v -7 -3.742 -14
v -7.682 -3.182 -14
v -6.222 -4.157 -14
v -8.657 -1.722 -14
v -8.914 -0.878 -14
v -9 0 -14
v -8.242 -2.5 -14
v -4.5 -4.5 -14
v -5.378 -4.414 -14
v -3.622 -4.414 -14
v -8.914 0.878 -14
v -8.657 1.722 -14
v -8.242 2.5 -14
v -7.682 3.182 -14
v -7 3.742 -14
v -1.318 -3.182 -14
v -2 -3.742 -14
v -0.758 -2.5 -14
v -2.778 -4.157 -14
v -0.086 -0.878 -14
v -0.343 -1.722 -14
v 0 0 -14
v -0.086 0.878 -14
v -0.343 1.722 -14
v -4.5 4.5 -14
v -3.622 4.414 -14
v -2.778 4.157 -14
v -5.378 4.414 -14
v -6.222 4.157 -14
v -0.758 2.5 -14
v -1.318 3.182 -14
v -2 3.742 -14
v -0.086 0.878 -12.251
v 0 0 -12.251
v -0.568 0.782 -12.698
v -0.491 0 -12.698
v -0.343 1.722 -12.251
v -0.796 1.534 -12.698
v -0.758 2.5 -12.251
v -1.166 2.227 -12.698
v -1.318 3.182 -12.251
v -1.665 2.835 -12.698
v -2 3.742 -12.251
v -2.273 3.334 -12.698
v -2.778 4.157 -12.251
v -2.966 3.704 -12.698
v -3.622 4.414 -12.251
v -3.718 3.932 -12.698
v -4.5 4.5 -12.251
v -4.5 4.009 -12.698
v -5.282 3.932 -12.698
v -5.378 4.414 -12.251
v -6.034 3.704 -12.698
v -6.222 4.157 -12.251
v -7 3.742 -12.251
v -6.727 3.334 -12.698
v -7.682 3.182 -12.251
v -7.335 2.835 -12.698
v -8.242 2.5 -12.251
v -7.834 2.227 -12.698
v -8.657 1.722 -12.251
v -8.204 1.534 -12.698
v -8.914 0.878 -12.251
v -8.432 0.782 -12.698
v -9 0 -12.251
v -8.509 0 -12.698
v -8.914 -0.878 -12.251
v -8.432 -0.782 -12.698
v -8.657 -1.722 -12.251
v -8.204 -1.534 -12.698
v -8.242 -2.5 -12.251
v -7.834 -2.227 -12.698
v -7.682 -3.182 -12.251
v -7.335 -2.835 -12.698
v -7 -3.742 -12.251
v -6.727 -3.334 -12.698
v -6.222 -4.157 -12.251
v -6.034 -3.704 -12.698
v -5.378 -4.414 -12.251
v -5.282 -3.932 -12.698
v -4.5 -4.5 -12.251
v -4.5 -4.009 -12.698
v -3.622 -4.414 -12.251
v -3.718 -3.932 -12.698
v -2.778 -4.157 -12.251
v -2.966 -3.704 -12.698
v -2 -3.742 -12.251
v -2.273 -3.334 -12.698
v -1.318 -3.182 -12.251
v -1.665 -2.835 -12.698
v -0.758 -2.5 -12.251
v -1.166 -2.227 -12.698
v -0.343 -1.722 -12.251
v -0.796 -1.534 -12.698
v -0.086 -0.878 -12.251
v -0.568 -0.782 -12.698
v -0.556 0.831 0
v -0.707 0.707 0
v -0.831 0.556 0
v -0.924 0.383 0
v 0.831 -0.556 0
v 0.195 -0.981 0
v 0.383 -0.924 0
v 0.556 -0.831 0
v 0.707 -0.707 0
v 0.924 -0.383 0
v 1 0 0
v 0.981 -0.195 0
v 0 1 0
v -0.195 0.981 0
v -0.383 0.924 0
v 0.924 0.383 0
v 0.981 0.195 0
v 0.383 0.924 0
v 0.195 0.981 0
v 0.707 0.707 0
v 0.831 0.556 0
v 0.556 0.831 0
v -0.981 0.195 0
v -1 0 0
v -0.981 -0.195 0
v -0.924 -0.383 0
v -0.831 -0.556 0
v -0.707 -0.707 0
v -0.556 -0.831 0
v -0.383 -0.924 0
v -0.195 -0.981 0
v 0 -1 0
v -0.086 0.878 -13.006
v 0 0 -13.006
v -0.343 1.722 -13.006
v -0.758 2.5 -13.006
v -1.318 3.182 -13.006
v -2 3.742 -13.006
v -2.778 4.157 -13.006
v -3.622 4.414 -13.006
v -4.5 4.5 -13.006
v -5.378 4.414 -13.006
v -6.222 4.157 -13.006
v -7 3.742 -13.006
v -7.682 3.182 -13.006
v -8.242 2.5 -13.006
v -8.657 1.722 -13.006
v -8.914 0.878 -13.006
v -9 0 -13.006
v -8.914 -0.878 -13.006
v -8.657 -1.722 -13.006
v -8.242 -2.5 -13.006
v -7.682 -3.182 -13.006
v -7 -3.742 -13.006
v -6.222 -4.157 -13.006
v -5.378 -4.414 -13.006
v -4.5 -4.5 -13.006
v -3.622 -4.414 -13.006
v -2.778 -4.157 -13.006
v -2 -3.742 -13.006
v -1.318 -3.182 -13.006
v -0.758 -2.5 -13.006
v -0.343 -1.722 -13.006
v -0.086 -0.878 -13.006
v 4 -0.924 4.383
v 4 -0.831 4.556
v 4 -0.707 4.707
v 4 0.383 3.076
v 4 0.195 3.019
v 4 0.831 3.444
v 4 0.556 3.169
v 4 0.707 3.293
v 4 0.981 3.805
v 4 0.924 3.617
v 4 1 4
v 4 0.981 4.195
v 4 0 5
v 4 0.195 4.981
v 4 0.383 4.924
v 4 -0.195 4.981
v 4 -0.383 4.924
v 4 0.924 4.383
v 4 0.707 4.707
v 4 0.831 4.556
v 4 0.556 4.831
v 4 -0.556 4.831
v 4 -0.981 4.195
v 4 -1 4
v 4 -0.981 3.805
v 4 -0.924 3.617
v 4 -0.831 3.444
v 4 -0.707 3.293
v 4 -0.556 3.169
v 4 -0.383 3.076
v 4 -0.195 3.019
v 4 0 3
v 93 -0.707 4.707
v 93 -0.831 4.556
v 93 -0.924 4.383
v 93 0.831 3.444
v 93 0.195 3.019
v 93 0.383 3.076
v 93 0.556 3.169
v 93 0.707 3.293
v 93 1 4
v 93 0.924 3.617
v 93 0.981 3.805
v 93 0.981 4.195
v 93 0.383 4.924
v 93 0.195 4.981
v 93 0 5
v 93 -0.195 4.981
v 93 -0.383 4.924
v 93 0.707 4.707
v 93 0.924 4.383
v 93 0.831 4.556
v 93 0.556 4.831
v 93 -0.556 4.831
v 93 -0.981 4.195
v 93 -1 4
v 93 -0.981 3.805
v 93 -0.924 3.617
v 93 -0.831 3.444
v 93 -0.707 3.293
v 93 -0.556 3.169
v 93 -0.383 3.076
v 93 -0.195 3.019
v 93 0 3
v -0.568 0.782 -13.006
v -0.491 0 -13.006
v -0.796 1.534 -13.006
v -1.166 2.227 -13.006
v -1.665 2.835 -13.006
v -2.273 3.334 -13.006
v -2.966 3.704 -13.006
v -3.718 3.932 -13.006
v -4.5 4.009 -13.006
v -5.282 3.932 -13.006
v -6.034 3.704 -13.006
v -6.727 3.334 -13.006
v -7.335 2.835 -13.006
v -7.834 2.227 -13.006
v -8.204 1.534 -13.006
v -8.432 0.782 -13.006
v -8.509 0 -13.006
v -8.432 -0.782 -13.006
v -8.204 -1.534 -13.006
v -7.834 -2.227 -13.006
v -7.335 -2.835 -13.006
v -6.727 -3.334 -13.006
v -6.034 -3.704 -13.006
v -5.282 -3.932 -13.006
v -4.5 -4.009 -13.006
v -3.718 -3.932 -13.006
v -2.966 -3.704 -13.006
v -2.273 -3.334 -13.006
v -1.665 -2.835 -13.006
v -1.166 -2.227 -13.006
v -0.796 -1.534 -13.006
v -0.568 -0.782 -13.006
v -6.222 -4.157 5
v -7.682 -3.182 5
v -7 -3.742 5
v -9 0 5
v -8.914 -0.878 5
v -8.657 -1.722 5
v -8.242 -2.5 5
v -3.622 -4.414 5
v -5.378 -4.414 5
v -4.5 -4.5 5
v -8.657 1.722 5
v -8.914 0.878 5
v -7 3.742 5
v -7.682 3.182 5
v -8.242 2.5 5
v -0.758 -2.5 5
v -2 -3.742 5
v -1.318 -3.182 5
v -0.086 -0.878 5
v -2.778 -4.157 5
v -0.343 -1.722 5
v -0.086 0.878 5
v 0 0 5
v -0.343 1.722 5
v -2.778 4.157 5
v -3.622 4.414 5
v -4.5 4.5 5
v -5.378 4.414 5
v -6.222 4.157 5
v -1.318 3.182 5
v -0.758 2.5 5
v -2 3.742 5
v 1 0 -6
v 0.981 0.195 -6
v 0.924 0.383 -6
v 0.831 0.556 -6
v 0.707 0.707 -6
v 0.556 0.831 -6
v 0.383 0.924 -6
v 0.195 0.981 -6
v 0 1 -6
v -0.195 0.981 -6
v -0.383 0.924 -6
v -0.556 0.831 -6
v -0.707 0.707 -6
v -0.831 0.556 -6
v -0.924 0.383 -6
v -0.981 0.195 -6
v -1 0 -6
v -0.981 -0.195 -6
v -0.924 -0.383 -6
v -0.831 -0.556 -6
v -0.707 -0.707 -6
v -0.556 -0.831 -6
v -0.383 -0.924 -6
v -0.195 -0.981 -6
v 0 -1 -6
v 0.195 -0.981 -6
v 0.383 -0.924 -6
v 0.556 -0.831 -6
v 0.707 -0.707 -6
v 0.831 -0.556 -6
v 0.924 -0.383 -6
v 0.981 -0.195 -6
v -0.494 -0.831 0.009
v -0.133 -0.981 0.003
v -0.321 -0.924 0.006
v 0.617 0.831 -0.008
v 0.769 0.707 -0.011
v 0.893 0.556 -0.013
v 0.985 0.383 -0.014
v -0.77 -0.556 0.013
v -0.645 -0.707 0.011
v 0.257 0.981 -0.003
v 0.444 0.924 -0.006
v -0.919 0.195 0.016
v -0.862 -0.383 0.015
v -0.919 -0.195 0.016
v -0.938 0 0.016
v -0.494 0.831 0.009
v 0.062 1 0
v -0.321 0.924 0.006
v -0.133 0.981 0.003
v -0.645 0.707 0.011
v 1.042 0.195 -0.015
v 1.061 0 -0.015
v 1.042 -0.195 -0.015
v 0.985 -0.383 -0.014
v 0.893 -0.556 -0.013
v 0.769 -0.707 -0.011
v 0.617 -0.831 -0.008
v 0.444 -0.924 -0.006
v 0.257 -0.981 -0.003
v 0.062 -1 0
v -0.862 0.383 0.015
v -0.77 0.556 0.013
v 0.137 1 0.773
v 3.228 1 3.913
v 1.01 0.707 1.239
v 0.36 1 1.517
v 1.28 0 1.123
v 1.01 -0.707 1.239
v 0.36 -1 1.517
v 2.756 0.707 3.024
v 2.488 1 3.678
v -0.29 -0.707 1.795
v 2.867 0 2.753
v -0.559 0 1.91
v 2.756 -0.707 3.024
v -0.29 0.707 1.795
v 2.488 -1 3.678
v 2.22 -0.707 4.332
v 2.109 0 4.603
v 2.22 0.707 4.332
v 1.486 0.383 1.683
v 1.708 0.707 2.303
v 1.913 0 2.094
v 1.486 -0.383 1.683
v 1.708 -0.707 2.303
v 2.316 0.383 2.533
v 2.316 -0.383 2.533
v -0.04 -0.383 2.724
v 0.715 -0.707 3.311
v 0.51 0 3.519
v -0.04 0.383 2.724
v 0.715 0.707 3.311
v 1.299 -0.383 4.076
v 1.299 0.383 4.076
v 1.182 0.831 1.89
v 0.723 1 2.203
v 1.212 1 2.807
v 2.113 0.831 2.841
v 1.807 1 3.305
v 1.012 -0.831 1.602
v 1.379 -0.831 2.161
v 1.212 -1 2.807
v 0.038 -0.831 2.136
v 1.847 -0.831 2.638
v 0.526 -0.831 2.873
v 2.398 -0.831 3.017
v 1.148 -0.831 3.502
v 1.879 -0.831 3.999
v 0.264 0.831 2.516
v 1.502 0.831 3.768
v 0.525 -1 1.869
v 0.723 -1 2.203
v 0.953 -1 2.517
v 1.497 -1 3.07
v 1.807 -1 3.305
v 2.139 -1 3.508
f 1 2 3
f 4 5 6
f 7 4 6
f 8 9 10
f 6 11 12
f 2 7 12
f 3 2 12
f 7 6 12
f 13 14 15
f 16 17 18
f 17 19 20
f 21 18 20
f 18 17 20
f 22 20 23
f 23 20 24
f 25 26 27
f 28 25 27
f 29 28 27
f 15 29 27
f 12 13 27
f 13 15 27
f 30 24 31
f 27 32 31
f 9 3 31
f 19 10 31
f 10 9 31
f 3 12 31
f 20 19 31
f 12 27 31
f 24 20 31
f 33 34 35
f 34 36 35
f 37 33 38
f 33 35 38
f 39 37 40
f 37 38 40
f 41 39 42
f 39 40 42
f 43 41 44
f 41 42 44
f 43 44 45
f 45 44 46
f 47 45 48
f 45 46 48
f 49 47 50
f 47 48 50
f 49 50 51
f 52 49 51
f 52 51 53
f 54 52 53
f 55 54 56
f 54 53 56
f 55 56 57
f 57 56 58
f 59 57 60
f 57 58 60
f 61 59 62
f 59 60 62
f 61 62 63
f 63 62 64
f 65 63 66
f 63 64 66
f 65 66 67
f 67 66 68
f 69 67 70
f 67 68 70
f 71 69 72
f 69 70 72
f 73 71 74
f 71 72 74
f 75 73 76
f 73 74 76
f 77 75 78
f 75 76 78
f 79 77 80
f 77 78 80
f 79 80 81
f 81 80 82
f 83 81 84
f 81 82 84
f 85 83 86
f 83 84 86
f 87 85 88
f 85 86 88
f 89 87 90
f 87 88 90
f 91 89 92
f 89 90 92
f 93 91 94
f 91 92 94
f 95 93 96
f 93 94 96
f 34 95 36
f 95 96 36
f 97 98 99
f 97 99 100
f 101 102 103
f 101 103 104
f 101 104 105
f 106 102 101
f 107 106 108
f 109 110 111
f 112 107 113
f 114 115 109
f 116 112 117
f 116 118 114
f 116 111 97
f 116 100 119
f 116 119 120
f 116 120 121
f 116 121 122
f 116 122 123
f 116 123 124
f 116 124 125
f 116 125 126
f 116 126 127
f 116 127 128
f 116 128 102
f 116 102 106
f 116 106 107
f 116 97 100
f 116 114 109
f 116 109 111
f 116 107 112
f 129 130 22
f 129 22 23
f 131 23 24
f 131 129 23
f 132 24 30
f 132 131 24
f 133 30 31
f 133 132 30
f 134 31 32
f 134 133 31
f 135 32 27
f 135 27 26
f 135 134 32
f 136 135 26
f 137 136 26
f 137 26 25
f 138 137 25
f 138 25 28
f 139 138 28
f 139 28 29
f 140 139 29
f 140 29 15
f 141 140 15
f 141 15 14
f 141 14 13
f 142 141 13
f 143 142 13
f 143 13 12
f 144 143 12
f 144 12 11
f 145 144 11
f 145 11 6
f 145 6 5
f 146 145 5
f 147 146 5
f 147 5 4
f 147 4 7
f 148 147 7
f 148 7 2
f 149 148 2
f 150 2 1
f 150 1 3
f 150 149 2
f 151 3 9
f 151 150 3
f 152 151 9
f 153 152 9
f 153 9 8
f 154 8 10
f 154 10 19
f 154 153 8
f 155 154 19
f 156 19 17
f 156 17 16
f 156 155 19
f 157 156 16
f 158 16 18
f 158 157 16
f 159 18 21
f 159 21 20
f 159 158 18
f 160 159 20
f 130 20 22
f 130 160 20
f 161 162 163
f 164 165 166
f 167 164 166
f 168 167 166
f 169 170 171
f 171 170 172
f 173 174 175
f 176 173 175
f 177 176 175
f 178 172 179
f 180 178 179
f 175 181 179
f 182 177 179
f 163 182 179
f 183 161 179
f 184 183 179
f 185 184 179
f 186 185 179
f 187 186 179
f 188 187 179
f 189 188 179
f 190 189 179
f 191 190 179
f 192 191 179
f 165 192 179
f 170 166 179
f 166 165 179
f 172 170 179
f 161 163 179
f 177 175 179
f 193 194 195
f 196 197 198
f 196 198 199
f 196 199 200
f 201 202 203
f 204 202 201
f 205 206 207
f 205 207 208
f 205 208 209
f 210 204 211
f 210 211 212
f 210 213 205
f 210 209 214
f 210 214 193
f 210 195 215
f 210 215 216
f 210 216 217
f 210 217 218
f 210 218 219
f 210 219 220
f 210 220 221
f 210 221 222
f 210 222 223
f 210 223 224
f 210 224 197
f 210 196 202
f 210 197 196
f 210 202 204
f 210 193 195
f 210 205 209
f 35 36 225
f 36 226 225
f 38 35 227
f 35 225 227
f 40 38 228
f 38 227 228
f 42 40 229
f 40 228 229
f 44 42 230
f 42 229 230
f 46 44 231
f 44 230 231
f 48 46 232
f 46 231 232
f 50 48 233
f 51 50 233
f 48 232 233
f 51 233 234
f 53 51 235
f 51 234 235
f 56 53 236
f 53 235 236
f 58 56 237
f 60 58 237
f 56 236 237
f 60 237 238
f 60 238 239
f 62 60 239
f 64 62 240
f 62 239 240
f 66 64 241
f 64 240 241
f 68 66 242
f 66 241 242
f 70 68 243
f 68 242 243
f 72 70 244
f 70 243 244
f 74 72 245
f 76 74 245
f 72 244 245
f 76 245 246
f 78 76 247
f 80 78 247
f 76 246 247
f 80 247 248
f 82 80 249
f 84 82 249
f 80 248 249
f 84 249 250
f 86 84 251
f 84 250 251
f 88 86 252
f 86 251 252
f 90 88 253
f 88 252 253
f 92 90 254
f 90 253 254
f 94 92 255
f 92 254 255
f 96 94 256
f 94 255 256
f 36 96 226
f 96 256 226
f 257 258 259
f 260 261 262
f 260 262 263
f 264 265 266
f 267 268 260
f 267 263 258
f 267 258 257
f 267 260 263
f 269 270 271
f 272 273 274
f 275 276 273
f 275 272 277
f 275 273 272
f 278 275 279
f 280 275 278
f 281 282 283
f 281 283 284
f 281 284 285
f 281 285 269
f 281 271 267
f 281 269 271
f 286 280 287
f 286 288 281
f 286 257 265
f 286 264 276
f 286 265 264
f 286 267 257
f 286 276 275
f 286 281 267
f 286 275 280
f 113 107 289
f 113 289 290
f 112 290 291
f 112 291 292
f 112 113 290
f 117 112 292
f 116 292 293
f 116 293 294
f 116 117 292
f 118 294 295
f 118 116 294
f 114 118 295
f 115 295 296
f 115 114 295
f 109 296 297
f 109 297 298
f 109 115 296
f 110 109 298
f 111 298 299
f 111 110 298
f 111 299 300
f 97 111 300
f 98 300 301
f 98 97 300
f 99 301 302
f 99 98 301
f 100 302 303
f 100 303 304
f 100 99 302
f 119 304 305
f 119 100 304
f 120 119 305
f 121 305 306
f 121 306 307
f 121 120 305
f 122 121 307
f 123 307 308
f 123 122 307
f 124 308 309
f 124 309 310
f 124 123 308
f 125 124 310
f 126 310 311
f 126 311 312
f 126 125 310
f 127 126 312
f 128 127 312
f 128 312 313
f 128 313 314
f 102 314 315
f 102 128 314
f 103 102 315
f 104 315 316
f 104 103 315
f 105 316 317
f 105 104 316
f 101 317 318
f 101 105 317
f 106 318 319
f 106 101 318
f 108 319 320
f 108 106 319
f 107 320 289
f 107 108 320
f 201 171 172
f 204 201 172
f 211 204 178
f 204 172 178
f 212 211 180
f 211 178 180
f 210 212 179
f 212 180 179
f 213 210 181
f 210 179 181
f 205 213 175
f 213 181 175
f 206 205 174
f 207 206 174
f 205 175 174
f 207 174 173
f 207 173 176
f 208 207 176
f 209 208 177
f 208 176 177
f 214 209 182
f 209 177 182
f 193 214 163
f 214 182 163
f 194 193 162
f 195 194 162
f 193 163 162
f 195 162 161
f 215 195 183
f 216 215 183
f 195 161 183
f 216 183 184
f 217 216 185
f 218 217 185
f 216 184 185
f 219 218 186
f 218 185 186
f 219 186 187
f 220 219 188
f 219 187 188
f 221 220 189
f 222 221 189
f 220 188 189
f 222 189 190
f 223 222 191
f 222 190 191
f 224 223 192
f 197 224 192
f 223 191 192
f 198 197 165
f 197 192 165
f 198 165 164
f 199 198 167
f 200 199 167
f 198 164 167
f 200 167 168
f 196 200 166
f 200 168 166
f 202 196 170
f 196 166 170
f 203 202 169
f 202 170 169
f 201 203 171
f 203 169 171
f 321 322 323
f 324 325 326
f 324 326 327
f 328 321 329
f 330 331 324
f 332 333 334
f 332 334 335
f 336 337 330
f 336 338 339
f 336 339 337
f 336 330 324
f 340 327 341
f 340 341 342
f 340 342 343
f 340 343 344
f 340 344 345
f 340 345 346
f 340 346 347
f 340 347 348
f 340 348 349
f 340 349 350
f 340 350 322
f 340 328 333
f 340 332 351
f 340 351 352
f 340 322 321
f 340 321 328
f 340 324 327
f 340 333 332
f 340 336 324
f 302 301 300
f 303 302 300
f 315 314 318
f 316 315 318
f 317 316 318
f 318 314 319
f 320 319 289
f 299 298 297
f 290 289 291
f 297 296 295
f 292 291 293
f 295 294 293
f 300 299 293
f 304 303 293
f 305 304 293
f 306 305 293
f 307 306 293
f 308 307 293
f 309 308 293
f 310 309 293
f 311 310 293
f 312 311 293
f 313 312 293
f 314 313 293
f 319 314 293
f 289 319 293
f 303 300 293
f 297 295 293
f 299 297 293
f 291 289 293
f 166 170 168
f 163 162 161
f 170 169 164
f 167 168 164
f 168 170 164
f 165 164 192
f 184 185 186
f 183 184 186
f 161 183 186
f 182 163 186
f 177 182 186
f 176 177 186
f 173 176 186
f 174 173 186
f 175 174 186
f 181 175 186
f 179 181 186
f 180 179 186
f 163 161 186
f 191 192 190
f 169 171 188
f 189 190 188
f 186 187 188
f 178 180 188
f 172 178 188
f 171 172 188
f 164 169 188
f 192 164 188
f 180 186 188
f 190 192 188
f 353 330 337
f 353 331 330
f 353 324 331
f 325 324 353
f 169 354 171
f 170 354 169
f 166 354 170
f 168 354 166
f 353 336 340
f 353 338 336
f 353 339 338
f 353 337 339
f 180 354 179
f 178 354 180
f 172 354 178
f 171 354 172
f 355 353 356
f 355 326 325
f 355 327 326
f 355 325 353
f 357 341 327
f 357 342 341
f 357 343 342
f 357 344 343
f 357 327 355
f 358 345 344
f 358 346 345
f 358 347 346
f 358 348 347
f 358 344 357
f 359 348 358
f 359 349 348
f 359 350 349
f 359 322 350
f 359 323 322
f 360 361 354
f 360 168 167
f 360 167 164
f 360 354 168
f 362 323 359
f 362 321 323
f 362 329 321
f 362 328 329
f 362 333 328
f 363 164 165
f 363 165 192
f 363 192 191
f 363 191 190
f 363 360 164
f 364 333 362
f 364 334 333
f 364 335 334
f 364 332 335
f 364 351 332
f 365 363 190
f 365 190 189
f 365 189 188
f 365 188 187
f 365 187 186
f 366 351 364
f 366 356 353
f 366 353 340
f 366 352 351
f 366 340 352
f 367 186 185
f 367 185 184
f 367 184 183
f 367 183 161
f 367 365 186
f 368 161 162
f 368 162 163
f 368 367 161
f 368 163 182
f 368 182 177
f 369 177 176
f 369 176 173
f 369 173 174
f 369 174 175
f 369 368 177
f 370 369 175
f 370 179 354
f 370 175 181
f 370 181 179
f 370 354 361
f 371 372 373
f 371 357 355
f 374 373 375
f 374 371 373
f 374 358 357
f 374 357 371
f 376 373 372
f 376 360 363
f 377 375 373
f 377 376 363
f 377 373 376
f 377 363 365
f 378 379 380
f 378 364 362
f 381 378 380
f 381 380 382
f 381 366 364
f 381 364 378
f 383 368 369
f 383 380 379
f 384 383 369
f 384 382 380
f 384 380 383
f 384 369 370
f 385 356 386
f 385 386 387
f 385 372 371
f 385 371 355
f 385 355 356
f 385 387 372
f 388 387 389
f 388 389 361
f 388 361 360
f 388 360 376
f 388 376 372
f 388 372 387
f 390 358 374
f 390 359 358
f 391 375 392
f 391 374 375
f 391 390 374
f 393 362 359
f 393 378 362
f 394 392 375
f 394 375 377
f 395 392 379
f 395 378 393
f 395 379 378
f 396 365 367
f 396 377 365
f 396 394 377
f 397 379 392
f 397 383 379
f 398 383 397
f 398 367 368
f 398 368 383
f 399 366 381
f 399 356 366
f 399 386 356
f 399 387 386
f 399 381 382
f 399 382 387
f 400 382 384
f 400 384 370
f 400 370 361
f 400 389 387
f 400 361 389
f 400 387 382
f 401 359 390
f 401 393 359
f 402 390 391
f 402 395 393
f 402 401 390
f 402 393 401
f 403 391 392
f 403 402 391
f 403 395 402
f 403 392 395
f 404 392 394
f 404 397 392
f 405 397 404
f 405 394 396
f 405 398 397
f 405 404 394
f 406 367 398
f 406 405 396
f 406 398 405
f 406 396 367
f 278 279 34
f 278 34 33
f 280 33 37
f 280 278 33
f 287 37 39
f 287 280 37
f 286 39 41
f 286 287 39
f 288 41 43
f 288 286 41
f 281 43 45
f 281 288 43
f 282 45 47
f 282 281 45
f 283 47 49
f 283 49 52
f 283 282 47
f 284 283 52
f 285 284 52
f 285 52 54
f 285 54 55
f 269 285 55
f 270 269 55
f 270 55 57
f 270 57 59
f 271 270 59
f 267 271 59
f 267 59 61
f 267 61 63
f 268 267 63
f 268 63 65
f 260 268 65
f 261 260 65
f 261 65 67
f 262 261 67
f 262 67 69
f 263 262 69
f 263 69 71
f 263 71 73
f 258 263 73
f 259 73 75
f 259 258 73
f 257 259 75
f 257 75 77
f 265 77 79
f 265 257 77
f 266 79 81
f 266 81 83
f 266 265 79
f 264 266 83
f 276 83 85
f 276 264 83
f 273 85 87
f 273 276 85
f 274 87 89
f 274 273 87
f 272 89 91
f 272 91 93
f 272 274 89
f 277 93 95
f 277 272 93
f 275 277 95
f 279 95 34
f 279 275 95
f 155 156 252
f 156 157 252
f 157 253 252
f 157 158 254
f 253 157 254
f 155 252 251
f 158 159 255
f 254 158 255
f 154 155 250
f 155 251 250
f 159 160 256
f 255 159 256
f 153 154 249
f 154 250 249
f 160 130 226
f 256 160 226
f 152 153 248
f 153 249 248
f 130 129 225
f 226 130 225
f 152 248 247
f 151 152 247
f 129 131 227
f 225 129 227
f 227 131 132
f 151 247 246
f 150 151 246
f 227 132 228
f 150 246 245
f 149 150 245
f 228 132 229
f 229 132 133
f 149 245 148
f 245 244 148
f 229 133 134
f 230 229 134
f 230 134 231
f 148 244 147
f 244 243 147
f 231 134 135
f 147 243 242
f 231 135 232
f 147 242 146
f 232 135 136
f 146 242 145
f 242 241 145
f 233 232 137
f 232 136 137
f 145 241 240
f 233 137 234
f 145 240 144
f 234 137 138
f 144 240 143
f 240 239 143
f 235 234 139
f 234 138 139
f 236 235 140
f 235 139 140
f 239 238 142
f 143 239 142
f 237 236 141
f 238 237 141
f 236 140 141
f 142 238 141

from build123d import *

# Parameters (mm, degrees)
F0_R      = 1
F3_DEPTH  = 6
F2_R      = 1
F4_DEPTH  = 89
F4_FACE_R = 1
F9_DEPTH  = 19


with BuildPart() as f3:
    # F0 (on Top) → F3 (new body)
    with BuildSketch(Plane.XY):
        Circle(F0_R)
    extrude(amount=-F3_DEPTH)


with BuildPart() as f4:
    # F2 (on offset) → F4 (new body)
    with BuildSketch(Plane.YZ.offset(4)):
        with Locations((0, 4)):
            Circle(F2_R)
    extrude(amount=F4_DEPTH)


with BuildPart() as f6:
    # F6: sweep along a path in F5
    with BuildLine(Plane.XZ) as f6_path:
        ThreePointArc((0, 0), (1.16746, 2.849852), (3.998772, 4.061581))
    # F4_face (on face) → F6 (sweep)
    with BuildSketch(Plane(origin=(4, 0, 4), x_dir=(0, 1, 0), z_dir=(-1, 0, 0))):
        Circle(F4_FACE_R)
    sweep(path=f6_path.line)


with BuildPart() as f9:
    # F8 (on offset) → F9 (new body)
    with BuildSketch(Plane.XY.offset(5)):
        with BuildLine():
            ThreePointArc((-9, 0), (-4.5, -4.5), (0, 0))
            Line((0, 0), (-4.5, 0))
            Line((-4.5, 0), (-9, 0))
        make_face()
        with BuildLine():
            Line((-4.5, 0), (0, 0))
            ThreePointArc((0, 0), (-4.5, 4.5), (-9, 0))
            Line((-9, 0), (-4.5, 0))
        make_face()
    extrude(amount=-F9_DEPTH)

    # F10 (on Front) → F12 (revolve, cut)
    with BuildSketch(Plane.XZ):
        Polygon((0, -13.005943), (0, -14.014255), (1.1325, -13.989662), (1.1325, -12.52638), (0, -12.250524), (-0.490637, -12.698313), (-0.490637, -13.005943), align=None)
    revolve(axis=Axis((-4.5, 0, -12.944212), (0, 0, 1)), mode=Mode.SUBTRACT)


solid = Compound([f3.part, f4.part, f6.part, f9.part])
